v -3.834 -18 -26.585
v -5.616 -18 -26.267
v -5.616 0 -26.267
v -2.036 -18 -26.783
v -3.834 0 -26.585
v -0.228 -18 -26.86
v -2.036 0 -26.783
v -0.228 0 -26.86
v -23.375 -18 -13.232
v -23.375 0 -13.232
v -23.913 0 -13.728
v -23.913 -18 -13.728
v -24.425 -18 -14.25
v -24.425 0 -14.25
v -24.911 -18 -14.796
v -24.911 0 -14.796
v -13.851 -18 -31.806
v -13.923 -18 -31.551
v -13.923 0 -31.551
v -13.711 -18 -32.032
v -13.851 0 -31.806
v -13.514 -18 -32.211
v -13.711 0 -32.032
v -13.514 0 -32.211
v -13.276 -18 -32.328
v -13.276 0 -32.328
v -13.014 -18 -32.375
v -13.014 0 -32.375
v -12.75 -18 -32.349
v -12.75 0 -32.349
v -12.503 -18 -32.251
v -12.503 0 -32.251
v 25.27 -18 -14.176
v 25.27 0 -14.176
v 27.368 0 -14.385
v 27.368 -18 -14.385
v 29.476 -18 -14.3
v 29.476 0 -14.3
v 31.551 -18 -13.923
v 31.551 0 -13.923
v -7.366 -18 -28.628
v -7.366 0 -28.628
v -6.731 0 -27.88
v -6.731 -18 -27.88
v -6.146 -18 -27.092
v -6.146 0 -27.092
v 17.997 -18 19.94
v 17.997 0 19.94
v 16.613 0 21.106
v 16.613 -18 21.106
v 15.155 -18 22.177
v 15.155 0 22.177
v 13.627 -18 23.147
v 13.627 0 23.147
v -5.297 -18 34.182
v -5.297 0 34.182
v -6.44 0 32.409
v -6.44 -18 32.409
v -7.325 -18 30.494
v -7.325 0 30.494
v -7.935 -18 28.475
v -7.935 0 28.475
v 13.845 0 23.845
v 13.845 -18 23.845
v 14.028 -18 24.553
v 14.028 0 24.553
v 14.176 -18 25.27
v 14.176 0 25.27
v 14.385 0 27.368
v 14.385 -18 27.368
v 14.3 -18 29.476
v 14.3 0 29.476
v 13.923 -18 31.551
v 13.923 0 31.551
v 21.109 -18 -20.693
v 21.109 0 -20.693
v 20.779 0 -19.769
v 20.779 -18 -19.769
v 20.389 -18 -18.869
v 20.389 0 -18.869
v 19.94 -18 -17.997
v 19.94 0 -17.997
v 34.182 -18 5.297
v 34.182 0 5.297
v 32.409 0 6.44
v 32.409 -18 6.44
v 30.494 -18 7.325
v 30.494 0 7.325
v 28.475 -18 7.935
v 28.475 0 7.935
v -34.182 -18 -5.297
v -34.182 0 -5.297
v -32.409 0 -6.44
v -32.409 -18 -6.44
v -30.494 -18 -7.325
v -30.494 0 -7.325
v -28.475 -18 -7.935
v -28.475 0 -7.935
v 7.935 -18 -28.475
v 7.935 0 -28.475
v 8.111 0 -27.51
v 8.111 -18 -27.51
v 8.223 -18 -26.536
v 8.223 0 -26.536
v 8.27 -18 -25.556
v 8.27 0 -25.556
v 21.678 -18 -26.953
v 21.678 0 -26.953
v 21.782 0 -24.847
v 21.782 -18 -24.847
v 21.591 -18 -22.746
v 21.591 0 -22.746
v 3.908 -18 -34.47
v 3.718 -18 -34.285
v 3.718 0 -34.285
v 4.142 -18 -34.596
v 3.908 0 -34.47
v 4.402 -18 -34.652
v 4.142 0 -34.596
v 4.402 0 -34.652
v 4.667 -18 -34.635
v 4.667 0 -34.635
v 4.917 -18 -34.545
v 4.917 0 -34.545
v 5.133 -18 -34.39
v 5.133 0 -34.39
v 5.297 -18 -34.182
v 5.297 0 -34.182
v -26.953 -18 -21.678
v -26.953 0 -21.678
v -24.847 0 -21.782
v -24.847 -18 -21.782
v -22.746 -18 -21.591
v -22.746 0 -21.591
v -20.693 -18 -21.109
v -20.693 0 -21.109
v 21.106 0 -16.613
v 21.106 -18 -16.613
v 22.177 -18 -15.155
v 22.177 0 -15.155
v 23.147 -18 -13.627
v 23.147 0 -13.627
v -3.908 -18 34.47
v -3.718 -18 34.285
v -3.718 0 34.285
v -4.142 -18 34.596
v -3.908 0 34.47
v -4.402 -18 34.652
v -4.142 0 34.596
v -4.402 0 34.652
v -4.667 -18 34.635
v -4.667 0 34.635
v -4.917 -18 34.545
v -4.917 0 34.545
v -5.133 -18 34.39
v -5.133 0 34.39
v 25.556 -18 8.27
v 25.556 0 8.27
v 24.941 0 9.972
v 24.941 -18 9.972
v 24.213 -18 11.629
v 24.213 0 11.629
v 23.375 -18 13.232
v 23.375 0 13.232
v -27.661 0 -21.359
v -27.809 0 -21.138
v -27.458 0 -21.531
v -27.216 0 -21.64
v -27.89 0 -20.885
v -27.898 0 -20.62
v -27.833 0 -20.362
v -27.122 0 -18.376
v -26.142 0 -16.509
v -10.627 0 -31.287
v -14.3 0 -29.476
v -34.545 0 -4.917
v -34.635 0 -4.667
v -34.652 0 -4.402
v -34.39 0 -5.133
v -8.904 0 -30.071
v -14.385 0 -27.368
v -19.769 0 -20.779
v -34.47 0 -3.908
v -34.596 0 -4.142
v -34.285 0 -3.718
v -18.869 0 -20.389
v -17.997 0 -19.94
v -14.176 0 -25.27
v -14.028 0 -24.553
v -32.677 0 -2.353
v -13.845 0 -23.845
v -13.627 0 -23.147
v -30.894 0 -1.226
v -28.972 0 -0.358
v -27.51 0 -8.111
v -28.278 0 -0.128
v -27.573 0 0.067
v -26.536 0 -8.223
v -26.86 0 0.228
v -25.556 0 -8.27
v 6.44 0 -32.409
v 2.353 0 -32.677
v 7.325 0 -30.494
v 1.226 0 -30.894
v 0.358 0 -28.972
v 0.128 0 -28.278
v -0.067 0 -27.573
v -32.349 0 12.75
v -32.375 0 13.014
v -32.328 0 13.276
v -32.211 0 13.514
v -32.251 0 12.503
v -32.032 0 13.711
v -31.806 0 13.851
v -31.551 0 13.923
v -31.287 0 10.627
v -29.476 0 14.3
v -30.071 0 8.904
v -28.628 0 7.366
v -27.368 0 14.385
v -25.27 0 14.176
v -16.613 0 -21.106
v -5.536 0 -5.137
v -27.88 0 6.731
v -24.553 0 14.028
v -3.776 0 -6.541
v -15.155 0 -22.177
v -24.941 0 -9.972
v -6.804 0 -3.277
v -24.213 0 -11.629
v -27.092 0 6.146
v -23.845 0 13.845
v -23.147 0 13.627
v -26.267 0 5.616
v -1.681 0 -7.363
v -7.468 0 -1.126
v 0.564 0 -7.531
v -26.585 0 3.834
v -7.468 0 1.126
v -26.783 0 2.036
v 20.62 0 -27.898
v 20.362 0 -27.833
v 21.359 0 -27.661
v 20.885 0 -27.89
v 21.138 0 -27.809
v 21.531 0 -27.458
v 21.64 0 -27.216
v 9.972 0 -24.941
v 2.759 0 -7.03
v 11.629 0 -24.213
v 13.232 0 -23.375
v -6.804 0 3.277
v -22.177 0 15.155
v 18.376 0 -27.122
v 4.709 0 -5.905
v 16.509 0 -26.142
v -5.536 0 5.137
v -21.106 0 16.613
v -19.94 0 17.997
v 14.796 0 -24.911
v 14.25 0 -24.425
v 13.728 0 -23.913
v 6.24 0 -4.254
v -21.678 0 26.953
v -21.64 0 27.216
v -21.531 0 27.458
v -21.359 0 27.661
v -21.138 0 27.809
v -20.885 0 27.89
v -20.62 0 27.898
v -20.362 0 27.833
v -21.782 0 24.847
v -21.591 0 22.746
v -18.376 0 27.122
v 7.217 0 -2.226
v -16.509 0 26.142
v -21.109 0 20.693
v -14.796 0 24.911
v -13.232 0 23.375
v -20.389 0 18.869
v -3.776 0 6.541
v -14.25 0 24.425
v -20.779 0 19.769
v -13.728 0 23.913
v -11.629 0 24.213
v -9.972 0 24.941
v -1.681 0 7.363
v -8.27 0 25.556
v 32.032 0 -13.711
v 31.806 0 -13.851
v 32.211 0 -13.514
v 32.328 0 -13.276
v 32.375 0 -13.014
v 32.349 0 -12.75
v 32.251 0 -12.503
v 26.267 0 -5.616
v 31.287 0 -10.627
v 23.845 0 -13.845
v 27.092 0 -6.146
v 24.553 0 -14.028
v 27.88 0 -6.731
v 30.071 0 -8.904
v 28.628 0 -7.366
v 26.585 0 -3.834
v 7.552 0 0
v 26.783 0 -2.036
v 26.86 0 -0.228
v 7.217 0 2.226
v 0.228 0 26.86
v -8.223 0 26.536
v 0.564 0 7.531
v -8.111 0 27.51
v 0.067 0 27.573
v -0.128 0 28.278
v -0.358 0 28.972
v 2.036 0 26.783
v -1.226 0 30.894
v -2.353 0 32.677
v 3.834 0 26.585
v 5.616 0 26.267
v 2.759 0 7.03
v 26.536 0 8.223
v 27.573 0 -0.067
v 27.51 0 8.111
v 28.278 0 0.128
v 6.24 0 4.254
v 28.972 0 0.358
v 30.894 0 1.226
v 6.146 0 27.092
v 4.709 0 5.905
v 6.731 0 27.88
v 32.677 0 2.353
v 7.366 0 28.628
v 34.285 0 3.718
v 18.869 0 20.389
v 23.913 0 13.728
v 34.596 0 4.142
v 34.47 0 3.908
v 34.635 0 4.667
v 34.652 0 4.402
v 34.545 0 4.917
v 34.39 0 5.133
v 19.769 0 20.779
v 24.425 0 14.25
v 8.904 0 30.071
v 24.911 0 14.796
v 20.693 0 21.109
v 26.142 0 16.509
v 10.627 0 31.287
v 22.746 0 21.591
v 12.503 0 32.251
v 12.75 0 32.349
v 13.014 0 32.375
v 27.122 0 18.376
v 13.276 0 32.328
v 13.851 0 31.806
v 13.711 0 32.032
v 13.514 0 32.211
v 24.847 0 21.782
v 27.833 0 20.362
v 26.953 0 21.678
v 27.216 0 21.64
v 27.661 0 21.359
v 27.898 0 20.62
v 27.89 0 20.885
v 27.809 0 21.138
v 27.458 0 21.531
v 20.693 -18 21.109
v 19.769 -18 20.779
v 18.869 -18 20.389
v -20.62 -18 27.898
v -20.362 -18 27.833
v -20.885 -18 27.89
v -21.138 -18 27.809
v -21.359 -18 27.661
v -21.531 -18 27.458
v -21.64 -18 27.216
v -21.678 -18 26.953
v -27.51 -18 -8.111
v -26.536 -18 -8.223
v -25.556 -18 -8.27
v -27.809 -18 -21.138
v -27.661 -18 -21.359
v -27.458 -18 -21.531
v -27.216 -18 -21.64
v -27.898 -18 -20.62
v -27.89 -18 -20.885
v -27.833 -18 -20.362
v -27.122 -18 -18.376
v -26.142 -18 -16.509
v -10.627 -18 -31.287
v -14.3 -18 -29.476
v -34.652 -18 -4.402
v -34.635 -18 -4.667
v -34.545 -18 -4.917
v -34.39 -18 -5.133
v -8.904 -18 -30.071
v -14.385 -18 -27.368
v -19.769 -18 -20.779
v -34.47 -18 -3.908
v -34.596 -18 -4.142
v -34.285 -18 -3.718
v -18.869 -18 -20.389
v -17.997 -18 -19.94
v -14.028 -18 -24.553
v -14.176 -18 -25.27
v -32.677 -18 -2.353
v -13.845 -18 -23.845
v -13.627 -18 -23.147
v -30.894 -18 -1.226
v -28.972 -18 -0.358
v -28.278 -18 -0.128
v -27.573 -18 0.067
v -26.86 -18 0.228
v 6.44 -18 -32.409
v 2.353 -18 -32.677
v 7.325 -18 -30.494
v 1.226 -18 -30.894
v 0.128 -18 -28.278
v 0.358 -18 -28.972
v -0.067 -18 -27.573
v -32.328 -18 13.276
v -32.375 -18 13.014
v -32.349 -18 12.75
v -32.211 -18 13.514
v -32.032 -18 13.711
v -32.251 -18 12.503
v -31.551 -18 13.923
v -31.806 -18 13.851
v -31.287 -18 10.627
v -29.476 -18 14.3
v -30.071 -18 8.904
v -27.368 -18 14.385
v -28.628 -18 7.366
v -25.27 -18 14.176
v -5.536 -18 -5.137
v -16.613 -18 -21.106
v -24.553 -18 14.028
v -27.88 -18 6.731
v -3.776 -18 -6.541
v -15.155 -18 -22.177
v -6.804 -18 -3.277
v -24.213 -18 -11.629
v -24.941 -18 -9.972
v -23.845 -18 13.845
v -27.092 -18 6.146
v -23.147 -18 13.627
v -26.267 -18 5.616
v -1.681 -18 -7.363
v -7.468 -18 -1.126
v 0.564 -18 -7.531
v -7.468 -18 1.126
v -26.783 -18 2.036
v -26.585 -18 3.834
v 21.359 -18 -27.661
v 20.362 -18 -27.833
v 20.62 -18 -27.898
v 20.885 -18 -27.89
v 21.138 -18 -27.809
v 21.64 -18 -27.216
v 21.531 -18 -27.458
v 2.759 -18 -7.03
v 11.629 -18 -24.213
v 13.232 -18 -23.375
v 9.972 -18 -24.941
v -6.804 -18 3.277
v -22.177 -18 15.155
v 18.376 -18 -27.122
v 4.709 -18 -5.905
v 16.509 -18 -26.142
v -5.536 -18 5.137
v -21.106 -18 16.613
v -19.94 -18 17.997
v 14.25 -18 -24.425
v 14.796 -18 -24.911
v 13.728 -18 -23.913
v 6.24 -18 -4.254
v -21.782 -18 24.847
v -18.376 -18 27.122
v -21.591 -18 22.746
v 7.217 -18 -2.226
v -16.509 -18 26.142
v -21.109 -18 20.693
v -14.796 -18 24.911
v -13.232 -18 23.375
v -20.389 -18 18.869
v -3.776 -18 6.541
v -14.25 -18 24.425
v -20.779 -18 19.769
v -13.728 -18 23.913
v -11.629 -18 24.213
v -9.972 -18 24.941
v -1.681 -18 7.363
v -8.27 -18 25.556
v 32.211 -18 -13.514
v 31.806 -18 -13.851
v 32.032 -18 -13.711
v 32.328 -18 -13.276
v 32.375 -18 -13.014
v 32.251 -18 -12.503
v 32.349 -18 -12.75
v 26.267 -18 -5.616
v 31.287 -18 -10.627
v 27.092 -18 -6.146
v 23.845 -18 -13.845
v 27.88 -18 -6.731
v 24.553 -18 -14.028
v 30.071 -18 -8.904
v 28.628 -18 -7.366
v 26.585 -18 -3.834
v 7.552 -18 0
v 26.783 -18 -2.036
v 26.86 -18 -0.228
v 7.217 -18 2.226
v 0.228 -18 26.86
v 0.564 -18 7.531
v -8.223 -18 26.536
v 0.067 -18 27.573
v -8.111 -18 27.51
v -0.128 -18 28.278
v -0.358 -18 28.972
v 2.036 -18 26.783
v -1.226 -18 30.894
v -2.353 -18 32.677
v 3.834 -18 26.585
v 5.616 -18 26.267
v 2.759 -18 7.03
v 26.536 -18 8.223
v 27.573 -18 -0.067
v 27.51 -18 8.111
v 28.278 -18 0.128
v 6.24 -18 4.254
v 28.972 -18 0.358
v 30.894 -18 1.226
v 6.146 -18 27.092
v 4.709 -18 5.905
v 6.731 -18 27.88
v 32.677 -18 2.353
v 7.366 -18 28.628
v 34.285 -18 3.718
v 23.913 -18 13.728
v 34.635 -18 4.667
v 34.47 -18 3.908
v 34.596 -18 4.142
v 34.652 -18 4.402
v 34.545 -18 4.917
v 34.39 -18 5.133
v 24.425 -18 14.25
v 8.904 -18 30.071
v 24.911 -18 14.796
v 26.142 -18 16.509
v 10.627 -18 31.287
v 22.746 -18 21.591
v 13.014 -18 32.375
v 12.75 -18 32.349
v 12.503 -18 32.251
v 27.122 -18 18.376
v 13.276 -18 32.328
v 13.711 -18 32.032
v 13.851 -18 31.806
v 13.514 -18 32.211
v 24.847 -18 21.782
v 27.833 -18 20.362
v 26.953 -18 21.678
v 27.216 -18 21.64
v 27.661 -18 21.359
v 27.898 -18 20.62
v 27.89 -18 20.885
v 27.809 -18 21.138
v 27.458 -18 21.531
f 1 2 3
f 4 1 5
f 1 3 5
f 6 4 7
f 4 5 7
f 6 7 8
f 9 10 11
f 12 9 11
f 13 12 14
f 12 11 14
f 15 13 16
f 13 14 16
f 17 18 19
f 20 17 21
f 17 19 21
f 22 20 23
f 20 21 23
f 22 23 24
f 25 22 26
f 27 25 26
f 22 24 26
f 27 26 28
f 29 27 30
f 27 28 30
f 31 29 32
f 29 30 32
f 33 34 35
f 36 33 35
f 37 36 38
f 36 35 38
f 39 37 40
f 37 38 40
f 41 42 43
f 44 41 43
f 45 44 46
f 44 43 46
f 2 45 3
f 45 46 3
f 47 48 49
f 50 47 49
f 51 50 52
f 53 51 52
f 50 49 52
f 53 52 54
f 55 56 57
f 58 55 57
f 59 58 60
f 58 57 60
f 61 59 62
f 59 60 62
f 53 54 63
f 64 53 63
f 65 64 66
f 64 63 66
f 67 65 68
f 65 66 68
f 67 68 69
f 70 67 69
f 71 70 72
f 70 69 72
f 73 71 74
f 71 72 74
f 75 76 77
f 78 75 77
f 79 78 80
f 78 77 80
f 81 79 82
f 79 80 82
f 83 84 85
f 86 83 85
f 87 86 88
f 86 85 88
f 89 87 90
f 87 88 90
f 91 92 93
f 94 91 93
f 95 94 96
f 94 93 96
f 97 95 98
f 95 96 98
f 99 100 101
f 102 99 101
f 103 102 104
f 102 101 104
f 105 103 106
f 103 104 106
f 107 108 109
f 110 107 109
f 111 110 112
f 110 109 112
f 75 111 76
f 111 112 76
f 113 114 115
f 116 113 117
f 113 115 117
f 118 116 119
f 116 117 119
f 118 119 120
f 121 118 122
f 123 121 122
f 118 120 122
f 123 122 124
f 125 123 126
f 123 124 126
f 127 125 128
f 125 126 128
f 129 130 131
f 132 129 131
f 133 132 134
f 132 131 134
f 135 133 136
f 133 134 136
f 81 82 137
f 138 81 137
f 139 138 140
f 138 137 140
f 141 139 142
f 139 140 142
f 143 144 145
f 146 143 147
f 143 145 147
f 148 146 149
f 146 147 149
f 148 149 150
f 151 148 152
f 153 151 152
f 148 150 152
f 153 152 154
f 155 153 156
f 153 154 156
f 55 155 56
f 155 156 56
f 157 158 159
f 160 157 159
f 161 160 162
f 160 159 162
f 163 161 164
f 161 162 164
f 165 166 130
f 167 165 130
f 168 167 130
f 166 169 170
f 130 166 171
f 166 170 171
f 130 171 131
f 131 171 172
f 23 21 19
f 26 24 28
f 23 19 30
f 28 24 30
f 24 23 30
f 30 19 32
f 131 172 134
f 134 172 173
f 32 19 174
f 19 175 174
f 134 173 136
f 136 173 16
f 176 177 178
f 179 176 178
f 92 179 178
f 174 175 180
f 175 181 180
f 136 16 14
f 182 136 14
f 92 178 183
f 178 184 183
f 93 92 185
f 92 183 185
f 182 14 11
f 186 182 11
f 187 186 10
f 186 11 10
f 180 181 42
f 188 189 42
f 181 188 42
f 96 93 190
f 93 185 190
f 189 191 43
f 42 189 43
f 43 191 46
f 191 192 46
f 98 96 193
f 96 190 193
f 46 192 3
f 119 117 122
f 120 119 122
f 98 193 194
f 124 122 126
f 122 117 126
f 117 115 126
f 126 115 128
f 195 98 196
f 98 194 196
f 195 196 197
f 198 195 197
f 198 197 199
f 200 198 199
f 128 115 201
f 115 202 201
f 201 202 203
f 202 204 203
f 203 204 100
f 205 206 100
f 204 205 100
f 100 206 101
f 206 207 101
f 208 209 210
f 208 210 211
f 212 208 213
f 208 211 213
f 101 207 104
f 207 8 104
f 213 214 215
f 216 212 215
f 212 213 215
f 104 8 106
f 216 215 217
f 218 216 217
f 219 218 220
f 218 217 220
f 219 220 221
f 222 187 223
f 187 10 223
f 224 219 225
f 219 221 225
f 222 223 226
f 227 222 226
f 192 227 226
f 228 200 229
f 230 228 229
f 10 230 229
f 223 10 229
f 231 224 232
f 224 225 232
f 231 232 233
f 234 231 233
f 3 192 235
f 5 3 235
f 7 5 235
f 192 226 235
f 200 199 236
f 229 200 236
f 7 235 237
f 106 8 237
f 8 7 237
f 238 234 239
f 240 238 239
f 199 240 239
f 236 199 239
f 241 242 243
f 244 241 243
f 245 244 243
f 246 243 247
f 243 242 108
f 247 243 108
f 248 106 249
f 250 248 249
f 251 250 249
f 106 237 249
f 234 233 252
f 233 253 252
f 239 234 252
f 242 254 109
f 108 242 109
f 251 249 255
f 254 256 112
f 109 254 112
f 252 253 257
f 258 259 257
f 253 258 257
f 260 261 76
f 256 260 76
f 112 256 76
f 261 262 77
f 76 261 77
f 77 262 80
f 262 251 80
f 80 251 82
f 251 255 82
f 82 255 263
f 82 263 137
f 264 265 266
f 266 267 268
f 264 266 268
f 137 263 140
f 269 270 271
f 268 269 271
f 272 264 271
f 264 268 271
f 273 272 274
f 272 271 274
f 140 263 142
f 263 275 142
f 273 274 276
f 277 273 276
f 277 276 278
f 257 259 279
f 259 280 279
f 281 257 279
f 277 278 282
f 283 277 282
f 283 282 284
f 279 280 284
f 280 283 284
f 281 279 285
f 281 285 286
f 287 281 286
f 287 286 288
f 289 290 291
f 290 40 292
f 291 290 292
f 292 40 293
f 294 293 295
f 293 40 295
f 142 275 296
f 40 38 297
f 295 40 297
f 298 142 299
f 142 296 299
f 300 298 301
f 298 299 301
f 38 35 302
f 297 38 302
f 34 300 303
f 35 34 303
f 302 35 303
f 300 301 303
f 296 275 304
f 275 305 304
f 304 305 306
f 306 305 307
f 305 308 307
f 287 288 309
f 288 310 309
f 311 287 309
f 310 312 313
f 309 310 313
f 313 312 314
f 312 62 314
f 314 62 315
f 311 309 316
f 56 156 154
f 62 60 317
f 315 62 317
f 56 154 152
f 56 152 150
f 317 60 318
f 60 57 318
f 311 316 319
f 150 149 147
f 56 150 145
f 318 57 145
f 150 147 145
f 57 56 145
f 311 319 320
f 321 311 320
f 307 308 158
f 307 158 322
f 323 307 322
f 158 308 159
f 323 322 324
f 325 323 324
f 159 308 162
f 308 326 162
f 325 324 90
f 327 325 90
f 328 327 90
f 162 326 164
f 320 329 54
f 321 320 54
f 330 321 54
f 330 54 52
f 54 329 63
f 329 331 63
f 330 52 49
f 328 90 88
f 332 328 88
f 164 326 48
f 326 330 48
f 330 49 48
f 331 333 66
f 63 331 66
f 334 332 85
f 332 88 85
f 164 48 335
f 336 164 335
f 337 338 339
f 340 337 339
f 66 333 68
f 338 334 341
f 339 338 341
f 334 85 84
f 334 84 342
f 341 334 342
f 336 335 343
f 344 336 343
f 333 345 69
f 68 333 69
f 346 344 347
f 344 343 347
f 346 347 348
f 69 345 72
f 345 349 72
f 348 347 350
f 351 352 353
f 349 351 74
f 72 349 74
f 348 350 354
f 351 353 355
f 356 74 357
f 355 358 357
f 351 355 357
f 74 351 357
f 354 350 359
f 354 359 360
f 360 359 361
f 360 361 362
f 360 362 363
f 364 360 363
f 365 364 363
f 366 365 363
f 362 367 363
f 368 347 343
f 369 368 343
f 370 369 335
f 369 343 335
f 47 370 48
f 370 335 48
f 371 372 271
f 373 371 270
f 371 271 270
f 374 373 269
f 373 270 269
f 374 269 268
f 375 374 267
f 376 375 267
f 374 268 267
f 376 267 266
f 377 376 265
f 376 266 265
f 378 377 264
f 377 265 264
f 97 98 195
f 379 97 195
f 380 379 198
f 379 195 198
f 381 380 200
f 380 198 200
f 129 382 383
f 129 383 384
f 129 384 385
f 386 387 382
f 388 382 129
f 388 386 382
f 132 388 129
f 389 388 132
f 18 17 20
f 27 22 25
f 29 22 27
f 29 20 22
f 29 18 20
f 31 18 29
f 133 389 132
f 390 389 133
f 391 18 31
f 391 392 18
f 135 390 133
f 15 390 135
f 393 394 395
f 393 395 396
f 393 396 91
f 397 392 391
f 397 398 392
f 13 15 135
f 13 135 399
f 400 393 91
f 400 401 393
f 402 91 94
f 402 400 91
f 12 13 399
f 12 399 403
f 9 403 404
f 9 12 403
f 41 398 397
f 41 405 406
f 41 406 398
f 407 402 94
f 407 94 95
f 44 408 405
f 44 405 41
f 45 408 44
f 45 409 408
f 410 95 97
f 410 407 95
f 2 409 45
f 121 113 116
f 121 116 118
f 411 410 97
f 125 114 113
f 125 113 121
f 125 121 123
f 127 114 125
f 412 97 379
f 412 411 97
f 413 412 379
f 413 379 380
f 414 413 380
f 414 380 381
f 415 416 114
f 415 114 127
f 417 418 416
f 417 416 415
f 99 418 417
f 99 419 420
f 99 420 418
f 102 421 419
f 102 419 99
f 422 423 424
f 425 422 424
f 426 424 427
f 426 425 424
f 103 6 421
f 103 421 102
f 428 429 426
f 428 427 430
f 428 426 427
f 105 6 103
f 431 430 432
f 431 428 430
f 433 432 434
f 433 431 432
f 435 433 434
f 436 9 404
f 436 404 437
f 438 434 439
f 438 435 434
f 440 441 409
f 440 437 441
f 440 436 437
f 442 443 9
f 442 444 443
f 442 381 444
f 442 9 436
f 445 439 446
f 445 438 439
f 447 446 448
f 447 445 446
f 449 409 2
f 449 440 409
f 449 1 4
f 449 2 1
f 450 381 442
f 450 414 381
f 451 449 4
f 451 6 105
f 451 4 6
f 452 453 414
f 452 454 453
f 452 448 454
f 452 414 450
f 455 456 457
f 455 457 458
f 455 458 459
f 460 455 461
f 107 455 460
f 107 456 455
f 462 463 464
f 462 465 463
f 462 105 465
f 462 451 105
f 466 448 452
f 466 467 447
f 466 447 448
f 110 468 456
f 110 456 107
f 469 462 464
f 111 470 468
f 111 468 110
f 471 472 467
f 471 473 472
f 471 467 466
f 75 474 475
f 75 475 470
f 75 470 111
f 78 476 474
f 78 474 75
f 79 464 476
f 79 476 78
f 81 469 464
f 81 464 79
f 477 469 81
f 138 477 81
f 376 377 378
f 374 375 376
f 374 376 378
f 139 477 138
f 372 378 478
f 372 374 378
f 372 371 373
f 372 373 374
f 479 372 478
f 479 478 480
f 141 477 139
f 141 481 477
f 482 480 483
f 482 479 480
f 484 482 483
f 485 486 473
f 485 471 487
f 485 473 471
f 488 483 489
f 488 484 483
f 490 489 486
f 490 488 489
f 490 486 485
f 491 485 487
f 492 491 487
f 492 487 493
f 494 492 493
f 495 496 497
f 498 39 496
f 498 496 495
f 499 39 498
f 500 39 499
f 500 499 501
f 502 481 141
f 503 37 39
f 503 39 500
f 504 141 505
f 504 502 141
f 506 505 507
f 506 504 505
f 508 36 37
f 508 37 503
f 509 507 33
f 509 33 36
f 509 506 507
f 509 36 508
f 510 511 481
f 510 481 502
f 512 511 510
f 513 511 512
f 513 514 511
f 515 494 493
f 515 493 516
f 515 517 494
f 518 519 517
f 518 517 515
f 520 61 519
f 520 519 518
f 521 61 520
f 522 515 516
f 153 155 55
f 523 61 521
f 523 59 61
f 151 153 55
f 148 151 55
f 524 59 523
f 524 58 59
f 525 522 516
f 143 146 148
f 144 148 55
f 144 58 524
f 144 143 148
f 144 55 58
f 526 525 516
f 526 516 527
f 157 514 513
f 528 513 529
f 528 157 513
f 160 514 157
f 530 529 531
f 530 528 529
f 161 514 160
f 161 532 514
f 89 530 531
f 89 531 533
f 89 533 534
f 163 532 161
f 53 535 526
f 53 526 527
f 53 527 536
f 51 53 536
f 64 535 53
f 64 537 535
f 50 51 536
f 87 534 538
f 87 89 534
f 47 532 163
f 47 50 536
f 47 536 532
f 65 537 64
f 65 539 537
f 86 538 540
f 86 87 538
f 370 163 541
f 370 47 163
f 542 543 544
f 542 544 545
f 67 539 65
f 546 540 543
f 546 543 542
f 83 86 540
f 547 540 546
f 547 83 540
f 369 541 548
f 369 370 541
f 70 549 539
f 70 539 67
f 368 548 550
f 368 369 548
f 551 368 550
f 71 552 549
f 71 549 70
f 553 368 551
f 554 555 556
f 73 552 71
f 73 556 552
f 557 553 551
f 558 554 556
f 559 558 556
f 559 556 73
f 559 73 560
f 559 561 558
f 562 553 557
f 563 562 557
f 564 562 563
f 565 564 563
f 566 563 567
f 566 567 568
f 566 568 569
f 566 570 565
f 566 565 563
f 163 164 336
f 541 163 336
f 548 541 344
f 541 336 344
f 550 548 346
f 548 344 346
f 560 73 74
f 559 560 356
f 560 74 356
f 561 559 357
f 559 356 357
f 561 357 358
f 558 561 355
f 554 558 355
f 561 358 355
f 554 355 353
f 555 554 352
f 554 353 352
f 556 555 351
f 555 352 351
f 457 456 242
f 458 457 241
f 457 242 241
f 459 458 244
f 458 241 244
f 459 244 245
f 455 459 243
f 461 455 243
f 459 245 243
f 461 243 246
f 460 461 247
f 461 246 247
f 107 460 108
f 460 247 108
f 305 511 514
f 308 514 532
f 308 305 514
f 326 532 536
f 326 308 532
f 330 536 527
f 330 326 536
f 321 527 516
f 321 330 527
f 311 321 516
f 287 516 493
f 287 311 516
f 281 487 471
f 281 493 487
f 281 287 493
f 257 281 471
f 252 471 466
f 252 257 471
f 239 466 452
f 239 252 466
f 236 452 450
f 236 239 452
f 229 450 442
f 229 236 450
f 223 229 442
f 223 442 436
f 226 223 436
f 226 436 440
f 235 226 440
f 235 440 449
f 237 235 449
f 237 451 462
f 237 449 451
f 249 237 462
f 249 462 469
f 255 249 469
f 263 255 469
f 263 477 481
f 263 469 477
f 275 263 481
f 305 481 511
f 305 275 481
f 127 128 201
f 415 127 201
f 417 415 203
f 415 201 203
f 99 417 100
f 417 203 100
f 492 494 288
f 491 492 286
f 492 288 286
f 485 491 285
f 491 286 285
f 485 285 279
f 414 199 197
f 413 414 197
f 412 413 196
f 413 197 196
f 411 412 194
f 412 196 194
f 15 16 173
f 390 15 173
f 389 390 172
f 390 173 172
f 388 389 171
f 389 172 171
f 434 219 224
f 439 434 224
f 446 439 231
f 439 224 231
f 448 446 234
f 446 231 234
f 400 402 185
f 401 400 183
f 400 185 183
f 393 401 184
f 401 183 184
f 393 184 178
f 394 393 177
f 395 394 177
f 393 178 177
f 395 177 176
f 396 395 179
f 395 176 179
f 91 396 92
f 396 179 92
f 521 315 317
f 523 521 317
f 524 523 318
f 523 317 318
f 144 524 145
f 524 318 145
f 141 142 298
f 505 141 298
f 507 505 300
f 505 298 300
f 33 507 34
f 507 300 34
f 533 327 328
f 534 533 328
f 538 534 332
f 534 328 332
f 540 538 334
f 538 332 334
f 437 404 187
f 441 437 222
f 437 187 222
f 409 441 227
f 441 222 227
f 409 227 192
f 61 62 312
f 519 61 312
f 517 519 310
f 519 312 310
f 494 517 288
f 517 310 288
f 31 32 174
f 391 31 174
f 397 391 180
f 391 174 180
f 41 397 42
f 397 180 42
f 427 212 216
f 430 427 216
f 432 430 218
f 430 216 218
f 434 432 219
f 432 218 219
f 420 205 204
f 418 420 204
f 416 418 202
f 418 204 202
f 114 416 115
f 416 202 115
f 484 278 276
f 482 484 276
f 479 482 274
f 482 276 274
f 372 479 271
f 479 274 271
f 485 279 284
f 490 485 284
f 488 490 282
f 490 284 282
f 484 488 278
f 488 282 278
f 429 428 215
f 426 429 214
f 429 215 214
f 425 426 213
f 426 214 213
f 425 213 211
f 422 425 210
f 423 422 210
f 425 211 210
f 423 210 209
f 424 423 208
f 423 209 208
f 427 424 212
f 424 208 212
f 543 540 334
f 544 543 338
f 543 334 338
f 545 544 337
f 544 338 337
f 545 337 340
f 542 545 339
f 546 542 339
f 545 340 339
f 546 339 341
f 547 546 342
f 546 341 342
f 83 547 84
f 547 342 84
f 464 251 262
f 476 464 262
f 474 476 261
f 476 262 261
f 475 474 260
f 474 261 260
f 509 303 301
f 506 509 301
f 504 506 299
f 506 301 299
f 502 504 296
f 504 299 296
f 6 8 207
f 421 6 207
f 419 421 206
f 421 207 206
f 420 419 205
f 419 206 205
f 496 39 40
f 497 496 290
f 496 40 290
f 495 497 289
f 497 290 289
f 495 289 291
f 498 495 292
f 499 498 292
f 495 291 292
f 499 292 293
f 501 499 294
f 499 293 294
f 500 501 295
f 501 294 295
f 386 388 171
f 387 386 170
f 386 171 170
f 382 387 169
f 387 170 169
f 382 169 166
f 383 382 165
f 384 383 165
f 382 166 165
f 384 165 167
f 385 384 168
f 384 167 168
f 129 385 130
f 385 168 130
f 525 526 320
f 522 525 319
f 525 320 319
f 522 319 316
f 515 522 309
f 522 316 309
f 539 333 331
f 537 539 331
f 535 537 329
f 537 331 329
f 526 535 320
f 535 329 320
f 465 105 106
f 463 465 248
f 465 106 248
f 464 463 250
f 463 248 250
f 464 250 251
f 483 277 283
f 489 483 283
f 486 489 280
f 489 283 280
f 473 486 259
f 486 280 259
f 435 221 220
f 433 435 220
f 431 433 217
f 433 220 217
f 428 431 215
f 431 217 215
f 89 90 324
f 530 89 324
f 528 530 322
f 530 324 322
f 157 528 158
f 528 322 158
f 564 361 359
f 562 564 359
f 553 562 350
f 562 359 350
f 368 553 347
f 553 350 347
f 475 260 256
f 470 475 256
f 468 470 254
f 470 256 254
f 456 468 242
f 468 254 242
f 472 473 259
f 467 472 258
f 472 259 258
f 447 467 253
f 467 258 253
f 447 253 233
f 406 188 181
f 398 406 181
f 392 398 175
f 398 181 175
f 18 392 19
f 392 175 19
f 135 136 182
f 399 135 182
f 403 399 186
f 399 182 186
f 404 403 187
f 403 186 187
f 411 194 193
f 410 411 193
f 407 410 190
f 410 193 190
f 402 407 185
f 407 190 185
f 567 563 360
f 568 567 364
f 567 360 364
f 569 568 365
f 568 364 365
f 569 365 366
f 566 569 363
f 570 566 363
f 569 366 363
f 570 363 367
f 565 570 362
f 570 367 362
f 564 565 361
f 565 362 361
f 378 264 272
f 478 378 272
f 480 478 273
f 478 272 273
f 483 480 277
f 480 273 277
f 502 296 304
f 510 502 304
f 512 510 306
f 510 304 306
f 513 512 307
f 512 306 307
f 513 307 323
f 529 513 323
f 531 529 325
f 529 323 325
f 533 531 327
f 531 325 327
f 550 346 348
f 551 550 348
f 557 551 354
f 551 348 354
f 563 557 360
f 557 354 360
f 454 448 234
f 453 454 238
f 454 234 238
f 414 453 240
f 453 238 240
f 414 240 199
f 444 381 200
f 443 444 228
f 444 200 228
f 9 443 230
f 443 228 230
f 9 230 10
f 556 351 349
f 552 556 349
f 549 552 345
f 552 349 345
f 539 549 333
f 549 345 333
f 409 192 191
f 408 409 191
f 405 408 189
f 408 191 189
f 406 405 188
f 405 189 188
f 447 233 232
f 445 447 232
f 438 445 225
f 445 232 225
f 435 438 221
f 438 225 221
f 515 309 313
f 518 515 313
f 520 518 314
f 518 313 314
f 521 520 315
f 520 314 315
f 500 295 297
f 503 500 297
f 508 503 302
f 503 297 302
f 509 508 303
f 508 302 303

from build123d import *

# Parameters (mm, degrees)
F0_R     = 7.5523457901
F1_DEPTH = 18
F2_COUNT = 12


with BuildPart() as f1:
    # F0 (on Front) → F1 (new body)
    with BuildSketch(Plane.XZ):
        with BuildLine():
            ThreePointArc((-8.2701024402, 25.55566211), (-15.8010660029, -21.7212516541), (26.8605, 0))
            ThreePointArc((26.8605, 0), (19.0736413542, 18.9125002509), (0.2278858833, 26.8595332847))
            ThreePointArc((0.2278858833, 26.8595332847), (-4.0736140952, 26.5498046782), (-8.2701024402, 25.55566211))
        make_face()
        Circle(F0_R, mode=Mode.SUBTRACT)
        with BuildLine():
            ThreePointArc((-8.2701024402, 25.55566211), (-4.0736140952, 26.5498046782), (0.2278858833, 26.8595332847))
            ThreePointArc((0.2278858833, 26.8595332847), (-0.0259637004, 27.9265875849), (-0.3583119198, 28.971857479))
            ThreePointArc((-0.3583119198, 28.971857479), (-1.7585942686, 31.8051493547), (-3.7177759967, 34.2850567048))
            ThreePointArc((-3.7177759967, 34.2850567048), (-4.5350574201, 34.6527650776), (-5.2973513139, 34.1815258688))
            ThreePointArc((-5.2973513139, 34.1815258688), (-6.9160791073, 31.467109939), (-7.9345630465, 28.475283745))
            ThreePointArc((-7.9345630465, 28.475283745), (-8.1751413026, 27.023840498), (-8.2701024402, 25.55566211))
        make_face()
    extrude(amount=F1_DEPTH)

    # F2: F1 ×12 about axis
    f2_axis = Axis((0, 0, 0), (0, 1, 0))


with BuildPart() as f1_1:
    add(f1.part)
    for i in range(1, F2_COUNT):
        add(f1.part.rotate(f2_axis, i * 360 / F2_COUNT))


solid = f1_1.part
